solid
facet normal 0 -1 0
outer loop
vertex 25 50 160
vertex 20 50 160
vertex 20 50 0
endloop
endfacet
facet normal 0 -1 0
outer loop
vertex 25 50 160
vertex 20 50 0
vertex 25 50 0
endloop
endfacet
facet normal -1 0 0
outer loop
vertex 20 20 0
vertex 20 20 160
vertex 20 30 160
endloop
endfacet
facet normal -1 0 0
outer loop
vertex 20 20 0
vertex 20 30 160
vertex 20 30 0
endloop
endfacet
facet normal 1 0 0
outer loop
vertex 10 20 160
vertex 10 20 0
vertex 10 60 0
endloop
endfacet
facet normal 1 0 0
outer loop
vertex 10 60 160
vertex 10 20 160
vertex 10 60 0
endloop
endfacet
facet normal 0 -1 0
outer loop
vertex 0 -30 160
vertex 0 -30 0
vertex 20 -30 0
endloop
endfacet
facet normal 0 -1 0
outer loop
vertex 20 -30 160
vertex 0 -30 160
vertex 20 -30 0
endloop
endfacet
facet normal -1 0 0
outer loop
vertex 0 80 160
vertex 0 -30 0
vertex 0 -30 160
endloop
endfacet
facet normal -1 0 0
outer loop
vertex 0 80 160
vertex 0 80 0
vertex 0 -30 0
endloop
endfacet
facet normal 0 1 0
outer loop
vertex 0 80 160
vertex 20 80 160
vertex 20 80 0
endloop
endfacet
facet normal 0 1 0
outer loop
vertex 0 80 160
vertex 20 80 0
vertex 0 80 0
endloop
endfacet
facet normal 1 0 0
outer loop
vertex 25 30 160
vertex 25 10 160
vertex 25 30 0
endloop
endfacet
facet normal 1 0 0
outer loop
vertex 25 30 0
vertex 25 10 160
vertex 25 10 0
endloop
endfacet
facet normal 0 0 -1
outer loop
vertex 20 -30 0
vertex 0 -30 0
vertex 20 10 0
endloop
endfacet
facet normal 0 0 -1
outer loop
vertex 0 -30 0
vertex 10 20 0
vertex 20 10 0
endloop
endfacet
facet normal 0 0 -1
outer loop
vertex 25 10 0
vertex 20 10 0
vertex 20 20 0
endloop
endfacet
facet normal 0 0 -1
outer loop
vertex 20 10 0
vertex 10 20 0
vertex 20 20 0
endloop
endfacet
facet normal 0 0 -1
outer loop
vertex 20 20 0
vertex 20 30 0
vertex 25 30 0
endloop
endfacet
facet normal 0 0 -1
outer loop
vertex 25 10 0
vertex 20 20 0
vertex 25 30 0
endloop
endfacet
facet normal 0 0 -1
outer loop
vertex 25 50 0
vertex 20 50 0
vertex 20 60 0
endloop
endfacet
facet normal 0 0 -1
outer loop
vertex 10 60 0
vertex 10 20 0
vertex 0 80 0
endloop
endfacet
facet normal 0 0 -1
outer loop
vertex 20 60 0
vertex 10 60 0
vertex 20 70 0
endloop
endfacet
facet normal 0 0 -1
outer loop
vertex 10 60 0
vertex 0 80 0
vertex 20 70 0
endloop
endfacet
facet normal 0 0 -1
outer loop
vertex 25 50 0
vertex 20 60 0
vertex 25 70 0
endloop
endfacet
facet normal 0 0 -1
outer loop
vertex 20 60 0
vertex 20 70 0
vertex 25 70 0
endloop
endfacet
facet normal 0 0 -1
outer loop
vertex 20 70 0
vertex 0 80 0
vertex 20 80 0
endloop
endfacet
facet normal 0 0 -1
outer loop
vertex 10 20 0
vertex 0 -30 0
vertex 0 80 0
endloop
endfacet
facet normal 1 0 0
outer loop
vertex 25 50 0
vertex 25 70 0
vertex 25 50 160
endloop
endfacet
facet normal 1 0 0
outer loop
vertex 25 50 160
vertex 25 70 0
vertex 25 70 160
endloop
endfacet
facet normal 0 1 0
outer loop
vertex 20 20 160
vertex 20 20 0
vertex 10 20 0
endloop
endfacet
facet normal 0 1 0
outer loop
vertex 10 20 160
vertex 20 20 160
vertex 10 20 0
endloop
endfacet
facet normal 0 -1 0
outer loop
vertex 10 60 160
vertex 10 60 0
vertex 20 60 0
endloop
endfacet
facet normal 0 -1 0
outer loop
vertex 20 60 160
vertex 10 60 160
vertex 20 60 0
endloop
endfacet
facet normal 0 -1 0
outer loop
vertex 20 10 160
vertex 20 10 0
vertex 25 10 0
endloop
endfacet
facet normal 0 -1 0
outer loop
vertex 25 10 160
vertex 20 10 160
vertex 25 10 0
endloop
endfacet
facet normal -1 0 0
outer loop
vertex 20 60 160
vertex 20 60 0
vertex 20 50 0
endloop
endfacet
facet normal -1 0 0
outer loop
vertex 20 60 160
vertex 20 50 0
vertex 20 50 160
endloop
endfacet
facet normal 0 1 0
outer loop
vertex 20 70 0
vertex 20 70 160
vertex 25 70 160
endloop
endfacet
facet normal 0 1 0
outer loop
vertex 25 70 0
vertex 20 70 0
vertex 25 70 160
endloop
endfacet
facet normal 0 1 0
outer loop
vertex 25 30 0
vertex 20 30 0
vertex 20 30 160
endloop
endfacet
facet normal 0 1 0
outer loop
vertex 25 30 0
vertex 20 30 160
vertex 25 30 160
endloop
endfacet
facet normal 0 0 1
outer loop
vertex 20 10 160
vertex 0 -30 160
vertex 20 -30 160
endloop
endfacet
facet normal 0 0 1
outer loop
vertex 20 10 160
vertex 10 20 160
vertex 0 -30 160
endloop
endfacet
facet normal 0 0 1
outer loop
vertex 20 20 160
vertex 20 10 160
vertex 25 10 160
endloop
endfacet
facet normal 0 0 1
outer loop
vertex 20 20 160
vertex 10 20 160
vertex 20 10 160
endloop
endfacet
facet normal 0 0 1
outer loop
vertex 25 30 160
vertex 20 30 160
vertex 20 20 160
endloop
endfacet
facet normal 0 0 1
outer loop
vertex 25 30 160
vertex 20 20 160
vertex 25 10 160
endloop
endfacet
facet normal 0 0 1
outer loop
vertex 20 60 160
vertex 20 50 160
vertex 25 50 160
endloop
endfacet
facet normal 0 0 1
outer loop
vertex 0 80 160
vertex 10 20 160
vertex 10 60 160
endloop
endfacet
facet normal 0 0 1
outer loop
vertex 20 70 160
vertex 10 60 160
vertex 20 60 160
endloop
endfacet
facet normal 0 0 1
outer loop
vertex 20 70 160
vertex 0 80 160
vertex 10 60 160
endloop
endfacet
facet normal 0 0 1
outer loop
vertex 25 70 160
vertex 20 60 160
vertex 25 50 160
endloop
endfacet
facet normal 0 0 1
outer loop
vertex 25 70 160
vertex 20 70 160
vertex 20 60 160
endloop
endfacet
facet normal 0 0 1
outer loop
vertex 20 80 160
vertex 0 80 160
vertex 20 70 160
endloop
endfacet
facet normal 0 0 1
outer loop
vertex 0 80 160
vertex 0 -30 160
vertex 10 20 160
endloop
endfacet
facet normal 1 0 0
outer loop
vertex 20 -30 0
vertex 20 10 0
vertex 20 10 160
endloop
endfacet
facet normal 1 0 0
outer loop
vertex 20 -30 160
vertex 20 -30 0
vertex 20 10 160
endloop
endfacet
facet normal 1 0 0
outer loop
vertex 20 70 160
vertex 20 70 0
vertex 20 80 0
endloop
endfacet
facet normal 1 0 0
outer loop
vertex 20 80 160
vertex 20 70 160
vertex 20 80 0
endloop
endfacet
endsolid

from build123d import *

# Parameters (mm, degrees)
BOSS_EXTRUDE1_DEPTH      = 160
SKETCH2_W                = 20
SKETCH2_H                = 160
BOSS_EXTRUDE2_DEPTH      = 30
BOSS_EXTRUDE3_DEPTH      = 10
BOSS_EXTRUDE3_DEPTH_BACK = 10
SKETCH3_W                = 5
SKETCH3_H                = 160
BOSS_EXTRUDE4_DEPTH      = 10
BOSS_EXTRUDE4_DEPTH_BACK = 10
SKETCH4_W                = 5
SKETCH4_H                = 160


with BuildPart() as part:
    # Sketch1 → Boss-Extrude1 (new body)
    with BuildSketch(Plane.XY):
        Polygon((0, 0), (20, 0), (20, 20), (10, 20), (10, 60), (20, 60), (20, 80), (0, 80), align=None)
    extrude(amount=BOSS_EXTRUDE1_DEPTH)

    # Sketch2 → Boss-Extrude2 (add)
    with BuildSketch(Plane.XZ):
        with Locations((10, 80)):
            Rectangle(SKETCH2_W, SKETCH2_H)
    extrude(amount=BOSS_EXTRUDE2_DEPTH)

    # Sketch3 → Boss-Extrude3 (add, two sides: drawn at the far end of the back side and taken through both)
    with BuildSketch(Plane(origin=(0, 20, 0), x_dir=(1, 0, 0), z_dir=(0, 1, 0)).offset(-BOSS_EXTRUDE3_DEPTH_BACK)):
        with Locations((22.5, -80)):
            Rectangle(SKETCH3_W, SKETCH3_H)
    extrude(amount=BOSS_EXTRUDE3_DEPTH + BOSS_EXTRUDE3_DEPTH_BACK)

    # Sketch4 → Boss-Extrude4 (add, two sides: drawn at the far end of the back side and taken through both)
    with BuildSketch(Plane.XZ.offset(-60).offset(-BOSS_EXTRUDE4_DEPTH_BACK)):
        with Locations((22.5, 80)):
            Rectangle(SKETCH4_W, SKETCH4_H)
    extrude(amount=BOSS_EXTRUDE4_DEPTH + BOSS_EXTRUDE4_DEPTH_BACK)


solid = part.part
